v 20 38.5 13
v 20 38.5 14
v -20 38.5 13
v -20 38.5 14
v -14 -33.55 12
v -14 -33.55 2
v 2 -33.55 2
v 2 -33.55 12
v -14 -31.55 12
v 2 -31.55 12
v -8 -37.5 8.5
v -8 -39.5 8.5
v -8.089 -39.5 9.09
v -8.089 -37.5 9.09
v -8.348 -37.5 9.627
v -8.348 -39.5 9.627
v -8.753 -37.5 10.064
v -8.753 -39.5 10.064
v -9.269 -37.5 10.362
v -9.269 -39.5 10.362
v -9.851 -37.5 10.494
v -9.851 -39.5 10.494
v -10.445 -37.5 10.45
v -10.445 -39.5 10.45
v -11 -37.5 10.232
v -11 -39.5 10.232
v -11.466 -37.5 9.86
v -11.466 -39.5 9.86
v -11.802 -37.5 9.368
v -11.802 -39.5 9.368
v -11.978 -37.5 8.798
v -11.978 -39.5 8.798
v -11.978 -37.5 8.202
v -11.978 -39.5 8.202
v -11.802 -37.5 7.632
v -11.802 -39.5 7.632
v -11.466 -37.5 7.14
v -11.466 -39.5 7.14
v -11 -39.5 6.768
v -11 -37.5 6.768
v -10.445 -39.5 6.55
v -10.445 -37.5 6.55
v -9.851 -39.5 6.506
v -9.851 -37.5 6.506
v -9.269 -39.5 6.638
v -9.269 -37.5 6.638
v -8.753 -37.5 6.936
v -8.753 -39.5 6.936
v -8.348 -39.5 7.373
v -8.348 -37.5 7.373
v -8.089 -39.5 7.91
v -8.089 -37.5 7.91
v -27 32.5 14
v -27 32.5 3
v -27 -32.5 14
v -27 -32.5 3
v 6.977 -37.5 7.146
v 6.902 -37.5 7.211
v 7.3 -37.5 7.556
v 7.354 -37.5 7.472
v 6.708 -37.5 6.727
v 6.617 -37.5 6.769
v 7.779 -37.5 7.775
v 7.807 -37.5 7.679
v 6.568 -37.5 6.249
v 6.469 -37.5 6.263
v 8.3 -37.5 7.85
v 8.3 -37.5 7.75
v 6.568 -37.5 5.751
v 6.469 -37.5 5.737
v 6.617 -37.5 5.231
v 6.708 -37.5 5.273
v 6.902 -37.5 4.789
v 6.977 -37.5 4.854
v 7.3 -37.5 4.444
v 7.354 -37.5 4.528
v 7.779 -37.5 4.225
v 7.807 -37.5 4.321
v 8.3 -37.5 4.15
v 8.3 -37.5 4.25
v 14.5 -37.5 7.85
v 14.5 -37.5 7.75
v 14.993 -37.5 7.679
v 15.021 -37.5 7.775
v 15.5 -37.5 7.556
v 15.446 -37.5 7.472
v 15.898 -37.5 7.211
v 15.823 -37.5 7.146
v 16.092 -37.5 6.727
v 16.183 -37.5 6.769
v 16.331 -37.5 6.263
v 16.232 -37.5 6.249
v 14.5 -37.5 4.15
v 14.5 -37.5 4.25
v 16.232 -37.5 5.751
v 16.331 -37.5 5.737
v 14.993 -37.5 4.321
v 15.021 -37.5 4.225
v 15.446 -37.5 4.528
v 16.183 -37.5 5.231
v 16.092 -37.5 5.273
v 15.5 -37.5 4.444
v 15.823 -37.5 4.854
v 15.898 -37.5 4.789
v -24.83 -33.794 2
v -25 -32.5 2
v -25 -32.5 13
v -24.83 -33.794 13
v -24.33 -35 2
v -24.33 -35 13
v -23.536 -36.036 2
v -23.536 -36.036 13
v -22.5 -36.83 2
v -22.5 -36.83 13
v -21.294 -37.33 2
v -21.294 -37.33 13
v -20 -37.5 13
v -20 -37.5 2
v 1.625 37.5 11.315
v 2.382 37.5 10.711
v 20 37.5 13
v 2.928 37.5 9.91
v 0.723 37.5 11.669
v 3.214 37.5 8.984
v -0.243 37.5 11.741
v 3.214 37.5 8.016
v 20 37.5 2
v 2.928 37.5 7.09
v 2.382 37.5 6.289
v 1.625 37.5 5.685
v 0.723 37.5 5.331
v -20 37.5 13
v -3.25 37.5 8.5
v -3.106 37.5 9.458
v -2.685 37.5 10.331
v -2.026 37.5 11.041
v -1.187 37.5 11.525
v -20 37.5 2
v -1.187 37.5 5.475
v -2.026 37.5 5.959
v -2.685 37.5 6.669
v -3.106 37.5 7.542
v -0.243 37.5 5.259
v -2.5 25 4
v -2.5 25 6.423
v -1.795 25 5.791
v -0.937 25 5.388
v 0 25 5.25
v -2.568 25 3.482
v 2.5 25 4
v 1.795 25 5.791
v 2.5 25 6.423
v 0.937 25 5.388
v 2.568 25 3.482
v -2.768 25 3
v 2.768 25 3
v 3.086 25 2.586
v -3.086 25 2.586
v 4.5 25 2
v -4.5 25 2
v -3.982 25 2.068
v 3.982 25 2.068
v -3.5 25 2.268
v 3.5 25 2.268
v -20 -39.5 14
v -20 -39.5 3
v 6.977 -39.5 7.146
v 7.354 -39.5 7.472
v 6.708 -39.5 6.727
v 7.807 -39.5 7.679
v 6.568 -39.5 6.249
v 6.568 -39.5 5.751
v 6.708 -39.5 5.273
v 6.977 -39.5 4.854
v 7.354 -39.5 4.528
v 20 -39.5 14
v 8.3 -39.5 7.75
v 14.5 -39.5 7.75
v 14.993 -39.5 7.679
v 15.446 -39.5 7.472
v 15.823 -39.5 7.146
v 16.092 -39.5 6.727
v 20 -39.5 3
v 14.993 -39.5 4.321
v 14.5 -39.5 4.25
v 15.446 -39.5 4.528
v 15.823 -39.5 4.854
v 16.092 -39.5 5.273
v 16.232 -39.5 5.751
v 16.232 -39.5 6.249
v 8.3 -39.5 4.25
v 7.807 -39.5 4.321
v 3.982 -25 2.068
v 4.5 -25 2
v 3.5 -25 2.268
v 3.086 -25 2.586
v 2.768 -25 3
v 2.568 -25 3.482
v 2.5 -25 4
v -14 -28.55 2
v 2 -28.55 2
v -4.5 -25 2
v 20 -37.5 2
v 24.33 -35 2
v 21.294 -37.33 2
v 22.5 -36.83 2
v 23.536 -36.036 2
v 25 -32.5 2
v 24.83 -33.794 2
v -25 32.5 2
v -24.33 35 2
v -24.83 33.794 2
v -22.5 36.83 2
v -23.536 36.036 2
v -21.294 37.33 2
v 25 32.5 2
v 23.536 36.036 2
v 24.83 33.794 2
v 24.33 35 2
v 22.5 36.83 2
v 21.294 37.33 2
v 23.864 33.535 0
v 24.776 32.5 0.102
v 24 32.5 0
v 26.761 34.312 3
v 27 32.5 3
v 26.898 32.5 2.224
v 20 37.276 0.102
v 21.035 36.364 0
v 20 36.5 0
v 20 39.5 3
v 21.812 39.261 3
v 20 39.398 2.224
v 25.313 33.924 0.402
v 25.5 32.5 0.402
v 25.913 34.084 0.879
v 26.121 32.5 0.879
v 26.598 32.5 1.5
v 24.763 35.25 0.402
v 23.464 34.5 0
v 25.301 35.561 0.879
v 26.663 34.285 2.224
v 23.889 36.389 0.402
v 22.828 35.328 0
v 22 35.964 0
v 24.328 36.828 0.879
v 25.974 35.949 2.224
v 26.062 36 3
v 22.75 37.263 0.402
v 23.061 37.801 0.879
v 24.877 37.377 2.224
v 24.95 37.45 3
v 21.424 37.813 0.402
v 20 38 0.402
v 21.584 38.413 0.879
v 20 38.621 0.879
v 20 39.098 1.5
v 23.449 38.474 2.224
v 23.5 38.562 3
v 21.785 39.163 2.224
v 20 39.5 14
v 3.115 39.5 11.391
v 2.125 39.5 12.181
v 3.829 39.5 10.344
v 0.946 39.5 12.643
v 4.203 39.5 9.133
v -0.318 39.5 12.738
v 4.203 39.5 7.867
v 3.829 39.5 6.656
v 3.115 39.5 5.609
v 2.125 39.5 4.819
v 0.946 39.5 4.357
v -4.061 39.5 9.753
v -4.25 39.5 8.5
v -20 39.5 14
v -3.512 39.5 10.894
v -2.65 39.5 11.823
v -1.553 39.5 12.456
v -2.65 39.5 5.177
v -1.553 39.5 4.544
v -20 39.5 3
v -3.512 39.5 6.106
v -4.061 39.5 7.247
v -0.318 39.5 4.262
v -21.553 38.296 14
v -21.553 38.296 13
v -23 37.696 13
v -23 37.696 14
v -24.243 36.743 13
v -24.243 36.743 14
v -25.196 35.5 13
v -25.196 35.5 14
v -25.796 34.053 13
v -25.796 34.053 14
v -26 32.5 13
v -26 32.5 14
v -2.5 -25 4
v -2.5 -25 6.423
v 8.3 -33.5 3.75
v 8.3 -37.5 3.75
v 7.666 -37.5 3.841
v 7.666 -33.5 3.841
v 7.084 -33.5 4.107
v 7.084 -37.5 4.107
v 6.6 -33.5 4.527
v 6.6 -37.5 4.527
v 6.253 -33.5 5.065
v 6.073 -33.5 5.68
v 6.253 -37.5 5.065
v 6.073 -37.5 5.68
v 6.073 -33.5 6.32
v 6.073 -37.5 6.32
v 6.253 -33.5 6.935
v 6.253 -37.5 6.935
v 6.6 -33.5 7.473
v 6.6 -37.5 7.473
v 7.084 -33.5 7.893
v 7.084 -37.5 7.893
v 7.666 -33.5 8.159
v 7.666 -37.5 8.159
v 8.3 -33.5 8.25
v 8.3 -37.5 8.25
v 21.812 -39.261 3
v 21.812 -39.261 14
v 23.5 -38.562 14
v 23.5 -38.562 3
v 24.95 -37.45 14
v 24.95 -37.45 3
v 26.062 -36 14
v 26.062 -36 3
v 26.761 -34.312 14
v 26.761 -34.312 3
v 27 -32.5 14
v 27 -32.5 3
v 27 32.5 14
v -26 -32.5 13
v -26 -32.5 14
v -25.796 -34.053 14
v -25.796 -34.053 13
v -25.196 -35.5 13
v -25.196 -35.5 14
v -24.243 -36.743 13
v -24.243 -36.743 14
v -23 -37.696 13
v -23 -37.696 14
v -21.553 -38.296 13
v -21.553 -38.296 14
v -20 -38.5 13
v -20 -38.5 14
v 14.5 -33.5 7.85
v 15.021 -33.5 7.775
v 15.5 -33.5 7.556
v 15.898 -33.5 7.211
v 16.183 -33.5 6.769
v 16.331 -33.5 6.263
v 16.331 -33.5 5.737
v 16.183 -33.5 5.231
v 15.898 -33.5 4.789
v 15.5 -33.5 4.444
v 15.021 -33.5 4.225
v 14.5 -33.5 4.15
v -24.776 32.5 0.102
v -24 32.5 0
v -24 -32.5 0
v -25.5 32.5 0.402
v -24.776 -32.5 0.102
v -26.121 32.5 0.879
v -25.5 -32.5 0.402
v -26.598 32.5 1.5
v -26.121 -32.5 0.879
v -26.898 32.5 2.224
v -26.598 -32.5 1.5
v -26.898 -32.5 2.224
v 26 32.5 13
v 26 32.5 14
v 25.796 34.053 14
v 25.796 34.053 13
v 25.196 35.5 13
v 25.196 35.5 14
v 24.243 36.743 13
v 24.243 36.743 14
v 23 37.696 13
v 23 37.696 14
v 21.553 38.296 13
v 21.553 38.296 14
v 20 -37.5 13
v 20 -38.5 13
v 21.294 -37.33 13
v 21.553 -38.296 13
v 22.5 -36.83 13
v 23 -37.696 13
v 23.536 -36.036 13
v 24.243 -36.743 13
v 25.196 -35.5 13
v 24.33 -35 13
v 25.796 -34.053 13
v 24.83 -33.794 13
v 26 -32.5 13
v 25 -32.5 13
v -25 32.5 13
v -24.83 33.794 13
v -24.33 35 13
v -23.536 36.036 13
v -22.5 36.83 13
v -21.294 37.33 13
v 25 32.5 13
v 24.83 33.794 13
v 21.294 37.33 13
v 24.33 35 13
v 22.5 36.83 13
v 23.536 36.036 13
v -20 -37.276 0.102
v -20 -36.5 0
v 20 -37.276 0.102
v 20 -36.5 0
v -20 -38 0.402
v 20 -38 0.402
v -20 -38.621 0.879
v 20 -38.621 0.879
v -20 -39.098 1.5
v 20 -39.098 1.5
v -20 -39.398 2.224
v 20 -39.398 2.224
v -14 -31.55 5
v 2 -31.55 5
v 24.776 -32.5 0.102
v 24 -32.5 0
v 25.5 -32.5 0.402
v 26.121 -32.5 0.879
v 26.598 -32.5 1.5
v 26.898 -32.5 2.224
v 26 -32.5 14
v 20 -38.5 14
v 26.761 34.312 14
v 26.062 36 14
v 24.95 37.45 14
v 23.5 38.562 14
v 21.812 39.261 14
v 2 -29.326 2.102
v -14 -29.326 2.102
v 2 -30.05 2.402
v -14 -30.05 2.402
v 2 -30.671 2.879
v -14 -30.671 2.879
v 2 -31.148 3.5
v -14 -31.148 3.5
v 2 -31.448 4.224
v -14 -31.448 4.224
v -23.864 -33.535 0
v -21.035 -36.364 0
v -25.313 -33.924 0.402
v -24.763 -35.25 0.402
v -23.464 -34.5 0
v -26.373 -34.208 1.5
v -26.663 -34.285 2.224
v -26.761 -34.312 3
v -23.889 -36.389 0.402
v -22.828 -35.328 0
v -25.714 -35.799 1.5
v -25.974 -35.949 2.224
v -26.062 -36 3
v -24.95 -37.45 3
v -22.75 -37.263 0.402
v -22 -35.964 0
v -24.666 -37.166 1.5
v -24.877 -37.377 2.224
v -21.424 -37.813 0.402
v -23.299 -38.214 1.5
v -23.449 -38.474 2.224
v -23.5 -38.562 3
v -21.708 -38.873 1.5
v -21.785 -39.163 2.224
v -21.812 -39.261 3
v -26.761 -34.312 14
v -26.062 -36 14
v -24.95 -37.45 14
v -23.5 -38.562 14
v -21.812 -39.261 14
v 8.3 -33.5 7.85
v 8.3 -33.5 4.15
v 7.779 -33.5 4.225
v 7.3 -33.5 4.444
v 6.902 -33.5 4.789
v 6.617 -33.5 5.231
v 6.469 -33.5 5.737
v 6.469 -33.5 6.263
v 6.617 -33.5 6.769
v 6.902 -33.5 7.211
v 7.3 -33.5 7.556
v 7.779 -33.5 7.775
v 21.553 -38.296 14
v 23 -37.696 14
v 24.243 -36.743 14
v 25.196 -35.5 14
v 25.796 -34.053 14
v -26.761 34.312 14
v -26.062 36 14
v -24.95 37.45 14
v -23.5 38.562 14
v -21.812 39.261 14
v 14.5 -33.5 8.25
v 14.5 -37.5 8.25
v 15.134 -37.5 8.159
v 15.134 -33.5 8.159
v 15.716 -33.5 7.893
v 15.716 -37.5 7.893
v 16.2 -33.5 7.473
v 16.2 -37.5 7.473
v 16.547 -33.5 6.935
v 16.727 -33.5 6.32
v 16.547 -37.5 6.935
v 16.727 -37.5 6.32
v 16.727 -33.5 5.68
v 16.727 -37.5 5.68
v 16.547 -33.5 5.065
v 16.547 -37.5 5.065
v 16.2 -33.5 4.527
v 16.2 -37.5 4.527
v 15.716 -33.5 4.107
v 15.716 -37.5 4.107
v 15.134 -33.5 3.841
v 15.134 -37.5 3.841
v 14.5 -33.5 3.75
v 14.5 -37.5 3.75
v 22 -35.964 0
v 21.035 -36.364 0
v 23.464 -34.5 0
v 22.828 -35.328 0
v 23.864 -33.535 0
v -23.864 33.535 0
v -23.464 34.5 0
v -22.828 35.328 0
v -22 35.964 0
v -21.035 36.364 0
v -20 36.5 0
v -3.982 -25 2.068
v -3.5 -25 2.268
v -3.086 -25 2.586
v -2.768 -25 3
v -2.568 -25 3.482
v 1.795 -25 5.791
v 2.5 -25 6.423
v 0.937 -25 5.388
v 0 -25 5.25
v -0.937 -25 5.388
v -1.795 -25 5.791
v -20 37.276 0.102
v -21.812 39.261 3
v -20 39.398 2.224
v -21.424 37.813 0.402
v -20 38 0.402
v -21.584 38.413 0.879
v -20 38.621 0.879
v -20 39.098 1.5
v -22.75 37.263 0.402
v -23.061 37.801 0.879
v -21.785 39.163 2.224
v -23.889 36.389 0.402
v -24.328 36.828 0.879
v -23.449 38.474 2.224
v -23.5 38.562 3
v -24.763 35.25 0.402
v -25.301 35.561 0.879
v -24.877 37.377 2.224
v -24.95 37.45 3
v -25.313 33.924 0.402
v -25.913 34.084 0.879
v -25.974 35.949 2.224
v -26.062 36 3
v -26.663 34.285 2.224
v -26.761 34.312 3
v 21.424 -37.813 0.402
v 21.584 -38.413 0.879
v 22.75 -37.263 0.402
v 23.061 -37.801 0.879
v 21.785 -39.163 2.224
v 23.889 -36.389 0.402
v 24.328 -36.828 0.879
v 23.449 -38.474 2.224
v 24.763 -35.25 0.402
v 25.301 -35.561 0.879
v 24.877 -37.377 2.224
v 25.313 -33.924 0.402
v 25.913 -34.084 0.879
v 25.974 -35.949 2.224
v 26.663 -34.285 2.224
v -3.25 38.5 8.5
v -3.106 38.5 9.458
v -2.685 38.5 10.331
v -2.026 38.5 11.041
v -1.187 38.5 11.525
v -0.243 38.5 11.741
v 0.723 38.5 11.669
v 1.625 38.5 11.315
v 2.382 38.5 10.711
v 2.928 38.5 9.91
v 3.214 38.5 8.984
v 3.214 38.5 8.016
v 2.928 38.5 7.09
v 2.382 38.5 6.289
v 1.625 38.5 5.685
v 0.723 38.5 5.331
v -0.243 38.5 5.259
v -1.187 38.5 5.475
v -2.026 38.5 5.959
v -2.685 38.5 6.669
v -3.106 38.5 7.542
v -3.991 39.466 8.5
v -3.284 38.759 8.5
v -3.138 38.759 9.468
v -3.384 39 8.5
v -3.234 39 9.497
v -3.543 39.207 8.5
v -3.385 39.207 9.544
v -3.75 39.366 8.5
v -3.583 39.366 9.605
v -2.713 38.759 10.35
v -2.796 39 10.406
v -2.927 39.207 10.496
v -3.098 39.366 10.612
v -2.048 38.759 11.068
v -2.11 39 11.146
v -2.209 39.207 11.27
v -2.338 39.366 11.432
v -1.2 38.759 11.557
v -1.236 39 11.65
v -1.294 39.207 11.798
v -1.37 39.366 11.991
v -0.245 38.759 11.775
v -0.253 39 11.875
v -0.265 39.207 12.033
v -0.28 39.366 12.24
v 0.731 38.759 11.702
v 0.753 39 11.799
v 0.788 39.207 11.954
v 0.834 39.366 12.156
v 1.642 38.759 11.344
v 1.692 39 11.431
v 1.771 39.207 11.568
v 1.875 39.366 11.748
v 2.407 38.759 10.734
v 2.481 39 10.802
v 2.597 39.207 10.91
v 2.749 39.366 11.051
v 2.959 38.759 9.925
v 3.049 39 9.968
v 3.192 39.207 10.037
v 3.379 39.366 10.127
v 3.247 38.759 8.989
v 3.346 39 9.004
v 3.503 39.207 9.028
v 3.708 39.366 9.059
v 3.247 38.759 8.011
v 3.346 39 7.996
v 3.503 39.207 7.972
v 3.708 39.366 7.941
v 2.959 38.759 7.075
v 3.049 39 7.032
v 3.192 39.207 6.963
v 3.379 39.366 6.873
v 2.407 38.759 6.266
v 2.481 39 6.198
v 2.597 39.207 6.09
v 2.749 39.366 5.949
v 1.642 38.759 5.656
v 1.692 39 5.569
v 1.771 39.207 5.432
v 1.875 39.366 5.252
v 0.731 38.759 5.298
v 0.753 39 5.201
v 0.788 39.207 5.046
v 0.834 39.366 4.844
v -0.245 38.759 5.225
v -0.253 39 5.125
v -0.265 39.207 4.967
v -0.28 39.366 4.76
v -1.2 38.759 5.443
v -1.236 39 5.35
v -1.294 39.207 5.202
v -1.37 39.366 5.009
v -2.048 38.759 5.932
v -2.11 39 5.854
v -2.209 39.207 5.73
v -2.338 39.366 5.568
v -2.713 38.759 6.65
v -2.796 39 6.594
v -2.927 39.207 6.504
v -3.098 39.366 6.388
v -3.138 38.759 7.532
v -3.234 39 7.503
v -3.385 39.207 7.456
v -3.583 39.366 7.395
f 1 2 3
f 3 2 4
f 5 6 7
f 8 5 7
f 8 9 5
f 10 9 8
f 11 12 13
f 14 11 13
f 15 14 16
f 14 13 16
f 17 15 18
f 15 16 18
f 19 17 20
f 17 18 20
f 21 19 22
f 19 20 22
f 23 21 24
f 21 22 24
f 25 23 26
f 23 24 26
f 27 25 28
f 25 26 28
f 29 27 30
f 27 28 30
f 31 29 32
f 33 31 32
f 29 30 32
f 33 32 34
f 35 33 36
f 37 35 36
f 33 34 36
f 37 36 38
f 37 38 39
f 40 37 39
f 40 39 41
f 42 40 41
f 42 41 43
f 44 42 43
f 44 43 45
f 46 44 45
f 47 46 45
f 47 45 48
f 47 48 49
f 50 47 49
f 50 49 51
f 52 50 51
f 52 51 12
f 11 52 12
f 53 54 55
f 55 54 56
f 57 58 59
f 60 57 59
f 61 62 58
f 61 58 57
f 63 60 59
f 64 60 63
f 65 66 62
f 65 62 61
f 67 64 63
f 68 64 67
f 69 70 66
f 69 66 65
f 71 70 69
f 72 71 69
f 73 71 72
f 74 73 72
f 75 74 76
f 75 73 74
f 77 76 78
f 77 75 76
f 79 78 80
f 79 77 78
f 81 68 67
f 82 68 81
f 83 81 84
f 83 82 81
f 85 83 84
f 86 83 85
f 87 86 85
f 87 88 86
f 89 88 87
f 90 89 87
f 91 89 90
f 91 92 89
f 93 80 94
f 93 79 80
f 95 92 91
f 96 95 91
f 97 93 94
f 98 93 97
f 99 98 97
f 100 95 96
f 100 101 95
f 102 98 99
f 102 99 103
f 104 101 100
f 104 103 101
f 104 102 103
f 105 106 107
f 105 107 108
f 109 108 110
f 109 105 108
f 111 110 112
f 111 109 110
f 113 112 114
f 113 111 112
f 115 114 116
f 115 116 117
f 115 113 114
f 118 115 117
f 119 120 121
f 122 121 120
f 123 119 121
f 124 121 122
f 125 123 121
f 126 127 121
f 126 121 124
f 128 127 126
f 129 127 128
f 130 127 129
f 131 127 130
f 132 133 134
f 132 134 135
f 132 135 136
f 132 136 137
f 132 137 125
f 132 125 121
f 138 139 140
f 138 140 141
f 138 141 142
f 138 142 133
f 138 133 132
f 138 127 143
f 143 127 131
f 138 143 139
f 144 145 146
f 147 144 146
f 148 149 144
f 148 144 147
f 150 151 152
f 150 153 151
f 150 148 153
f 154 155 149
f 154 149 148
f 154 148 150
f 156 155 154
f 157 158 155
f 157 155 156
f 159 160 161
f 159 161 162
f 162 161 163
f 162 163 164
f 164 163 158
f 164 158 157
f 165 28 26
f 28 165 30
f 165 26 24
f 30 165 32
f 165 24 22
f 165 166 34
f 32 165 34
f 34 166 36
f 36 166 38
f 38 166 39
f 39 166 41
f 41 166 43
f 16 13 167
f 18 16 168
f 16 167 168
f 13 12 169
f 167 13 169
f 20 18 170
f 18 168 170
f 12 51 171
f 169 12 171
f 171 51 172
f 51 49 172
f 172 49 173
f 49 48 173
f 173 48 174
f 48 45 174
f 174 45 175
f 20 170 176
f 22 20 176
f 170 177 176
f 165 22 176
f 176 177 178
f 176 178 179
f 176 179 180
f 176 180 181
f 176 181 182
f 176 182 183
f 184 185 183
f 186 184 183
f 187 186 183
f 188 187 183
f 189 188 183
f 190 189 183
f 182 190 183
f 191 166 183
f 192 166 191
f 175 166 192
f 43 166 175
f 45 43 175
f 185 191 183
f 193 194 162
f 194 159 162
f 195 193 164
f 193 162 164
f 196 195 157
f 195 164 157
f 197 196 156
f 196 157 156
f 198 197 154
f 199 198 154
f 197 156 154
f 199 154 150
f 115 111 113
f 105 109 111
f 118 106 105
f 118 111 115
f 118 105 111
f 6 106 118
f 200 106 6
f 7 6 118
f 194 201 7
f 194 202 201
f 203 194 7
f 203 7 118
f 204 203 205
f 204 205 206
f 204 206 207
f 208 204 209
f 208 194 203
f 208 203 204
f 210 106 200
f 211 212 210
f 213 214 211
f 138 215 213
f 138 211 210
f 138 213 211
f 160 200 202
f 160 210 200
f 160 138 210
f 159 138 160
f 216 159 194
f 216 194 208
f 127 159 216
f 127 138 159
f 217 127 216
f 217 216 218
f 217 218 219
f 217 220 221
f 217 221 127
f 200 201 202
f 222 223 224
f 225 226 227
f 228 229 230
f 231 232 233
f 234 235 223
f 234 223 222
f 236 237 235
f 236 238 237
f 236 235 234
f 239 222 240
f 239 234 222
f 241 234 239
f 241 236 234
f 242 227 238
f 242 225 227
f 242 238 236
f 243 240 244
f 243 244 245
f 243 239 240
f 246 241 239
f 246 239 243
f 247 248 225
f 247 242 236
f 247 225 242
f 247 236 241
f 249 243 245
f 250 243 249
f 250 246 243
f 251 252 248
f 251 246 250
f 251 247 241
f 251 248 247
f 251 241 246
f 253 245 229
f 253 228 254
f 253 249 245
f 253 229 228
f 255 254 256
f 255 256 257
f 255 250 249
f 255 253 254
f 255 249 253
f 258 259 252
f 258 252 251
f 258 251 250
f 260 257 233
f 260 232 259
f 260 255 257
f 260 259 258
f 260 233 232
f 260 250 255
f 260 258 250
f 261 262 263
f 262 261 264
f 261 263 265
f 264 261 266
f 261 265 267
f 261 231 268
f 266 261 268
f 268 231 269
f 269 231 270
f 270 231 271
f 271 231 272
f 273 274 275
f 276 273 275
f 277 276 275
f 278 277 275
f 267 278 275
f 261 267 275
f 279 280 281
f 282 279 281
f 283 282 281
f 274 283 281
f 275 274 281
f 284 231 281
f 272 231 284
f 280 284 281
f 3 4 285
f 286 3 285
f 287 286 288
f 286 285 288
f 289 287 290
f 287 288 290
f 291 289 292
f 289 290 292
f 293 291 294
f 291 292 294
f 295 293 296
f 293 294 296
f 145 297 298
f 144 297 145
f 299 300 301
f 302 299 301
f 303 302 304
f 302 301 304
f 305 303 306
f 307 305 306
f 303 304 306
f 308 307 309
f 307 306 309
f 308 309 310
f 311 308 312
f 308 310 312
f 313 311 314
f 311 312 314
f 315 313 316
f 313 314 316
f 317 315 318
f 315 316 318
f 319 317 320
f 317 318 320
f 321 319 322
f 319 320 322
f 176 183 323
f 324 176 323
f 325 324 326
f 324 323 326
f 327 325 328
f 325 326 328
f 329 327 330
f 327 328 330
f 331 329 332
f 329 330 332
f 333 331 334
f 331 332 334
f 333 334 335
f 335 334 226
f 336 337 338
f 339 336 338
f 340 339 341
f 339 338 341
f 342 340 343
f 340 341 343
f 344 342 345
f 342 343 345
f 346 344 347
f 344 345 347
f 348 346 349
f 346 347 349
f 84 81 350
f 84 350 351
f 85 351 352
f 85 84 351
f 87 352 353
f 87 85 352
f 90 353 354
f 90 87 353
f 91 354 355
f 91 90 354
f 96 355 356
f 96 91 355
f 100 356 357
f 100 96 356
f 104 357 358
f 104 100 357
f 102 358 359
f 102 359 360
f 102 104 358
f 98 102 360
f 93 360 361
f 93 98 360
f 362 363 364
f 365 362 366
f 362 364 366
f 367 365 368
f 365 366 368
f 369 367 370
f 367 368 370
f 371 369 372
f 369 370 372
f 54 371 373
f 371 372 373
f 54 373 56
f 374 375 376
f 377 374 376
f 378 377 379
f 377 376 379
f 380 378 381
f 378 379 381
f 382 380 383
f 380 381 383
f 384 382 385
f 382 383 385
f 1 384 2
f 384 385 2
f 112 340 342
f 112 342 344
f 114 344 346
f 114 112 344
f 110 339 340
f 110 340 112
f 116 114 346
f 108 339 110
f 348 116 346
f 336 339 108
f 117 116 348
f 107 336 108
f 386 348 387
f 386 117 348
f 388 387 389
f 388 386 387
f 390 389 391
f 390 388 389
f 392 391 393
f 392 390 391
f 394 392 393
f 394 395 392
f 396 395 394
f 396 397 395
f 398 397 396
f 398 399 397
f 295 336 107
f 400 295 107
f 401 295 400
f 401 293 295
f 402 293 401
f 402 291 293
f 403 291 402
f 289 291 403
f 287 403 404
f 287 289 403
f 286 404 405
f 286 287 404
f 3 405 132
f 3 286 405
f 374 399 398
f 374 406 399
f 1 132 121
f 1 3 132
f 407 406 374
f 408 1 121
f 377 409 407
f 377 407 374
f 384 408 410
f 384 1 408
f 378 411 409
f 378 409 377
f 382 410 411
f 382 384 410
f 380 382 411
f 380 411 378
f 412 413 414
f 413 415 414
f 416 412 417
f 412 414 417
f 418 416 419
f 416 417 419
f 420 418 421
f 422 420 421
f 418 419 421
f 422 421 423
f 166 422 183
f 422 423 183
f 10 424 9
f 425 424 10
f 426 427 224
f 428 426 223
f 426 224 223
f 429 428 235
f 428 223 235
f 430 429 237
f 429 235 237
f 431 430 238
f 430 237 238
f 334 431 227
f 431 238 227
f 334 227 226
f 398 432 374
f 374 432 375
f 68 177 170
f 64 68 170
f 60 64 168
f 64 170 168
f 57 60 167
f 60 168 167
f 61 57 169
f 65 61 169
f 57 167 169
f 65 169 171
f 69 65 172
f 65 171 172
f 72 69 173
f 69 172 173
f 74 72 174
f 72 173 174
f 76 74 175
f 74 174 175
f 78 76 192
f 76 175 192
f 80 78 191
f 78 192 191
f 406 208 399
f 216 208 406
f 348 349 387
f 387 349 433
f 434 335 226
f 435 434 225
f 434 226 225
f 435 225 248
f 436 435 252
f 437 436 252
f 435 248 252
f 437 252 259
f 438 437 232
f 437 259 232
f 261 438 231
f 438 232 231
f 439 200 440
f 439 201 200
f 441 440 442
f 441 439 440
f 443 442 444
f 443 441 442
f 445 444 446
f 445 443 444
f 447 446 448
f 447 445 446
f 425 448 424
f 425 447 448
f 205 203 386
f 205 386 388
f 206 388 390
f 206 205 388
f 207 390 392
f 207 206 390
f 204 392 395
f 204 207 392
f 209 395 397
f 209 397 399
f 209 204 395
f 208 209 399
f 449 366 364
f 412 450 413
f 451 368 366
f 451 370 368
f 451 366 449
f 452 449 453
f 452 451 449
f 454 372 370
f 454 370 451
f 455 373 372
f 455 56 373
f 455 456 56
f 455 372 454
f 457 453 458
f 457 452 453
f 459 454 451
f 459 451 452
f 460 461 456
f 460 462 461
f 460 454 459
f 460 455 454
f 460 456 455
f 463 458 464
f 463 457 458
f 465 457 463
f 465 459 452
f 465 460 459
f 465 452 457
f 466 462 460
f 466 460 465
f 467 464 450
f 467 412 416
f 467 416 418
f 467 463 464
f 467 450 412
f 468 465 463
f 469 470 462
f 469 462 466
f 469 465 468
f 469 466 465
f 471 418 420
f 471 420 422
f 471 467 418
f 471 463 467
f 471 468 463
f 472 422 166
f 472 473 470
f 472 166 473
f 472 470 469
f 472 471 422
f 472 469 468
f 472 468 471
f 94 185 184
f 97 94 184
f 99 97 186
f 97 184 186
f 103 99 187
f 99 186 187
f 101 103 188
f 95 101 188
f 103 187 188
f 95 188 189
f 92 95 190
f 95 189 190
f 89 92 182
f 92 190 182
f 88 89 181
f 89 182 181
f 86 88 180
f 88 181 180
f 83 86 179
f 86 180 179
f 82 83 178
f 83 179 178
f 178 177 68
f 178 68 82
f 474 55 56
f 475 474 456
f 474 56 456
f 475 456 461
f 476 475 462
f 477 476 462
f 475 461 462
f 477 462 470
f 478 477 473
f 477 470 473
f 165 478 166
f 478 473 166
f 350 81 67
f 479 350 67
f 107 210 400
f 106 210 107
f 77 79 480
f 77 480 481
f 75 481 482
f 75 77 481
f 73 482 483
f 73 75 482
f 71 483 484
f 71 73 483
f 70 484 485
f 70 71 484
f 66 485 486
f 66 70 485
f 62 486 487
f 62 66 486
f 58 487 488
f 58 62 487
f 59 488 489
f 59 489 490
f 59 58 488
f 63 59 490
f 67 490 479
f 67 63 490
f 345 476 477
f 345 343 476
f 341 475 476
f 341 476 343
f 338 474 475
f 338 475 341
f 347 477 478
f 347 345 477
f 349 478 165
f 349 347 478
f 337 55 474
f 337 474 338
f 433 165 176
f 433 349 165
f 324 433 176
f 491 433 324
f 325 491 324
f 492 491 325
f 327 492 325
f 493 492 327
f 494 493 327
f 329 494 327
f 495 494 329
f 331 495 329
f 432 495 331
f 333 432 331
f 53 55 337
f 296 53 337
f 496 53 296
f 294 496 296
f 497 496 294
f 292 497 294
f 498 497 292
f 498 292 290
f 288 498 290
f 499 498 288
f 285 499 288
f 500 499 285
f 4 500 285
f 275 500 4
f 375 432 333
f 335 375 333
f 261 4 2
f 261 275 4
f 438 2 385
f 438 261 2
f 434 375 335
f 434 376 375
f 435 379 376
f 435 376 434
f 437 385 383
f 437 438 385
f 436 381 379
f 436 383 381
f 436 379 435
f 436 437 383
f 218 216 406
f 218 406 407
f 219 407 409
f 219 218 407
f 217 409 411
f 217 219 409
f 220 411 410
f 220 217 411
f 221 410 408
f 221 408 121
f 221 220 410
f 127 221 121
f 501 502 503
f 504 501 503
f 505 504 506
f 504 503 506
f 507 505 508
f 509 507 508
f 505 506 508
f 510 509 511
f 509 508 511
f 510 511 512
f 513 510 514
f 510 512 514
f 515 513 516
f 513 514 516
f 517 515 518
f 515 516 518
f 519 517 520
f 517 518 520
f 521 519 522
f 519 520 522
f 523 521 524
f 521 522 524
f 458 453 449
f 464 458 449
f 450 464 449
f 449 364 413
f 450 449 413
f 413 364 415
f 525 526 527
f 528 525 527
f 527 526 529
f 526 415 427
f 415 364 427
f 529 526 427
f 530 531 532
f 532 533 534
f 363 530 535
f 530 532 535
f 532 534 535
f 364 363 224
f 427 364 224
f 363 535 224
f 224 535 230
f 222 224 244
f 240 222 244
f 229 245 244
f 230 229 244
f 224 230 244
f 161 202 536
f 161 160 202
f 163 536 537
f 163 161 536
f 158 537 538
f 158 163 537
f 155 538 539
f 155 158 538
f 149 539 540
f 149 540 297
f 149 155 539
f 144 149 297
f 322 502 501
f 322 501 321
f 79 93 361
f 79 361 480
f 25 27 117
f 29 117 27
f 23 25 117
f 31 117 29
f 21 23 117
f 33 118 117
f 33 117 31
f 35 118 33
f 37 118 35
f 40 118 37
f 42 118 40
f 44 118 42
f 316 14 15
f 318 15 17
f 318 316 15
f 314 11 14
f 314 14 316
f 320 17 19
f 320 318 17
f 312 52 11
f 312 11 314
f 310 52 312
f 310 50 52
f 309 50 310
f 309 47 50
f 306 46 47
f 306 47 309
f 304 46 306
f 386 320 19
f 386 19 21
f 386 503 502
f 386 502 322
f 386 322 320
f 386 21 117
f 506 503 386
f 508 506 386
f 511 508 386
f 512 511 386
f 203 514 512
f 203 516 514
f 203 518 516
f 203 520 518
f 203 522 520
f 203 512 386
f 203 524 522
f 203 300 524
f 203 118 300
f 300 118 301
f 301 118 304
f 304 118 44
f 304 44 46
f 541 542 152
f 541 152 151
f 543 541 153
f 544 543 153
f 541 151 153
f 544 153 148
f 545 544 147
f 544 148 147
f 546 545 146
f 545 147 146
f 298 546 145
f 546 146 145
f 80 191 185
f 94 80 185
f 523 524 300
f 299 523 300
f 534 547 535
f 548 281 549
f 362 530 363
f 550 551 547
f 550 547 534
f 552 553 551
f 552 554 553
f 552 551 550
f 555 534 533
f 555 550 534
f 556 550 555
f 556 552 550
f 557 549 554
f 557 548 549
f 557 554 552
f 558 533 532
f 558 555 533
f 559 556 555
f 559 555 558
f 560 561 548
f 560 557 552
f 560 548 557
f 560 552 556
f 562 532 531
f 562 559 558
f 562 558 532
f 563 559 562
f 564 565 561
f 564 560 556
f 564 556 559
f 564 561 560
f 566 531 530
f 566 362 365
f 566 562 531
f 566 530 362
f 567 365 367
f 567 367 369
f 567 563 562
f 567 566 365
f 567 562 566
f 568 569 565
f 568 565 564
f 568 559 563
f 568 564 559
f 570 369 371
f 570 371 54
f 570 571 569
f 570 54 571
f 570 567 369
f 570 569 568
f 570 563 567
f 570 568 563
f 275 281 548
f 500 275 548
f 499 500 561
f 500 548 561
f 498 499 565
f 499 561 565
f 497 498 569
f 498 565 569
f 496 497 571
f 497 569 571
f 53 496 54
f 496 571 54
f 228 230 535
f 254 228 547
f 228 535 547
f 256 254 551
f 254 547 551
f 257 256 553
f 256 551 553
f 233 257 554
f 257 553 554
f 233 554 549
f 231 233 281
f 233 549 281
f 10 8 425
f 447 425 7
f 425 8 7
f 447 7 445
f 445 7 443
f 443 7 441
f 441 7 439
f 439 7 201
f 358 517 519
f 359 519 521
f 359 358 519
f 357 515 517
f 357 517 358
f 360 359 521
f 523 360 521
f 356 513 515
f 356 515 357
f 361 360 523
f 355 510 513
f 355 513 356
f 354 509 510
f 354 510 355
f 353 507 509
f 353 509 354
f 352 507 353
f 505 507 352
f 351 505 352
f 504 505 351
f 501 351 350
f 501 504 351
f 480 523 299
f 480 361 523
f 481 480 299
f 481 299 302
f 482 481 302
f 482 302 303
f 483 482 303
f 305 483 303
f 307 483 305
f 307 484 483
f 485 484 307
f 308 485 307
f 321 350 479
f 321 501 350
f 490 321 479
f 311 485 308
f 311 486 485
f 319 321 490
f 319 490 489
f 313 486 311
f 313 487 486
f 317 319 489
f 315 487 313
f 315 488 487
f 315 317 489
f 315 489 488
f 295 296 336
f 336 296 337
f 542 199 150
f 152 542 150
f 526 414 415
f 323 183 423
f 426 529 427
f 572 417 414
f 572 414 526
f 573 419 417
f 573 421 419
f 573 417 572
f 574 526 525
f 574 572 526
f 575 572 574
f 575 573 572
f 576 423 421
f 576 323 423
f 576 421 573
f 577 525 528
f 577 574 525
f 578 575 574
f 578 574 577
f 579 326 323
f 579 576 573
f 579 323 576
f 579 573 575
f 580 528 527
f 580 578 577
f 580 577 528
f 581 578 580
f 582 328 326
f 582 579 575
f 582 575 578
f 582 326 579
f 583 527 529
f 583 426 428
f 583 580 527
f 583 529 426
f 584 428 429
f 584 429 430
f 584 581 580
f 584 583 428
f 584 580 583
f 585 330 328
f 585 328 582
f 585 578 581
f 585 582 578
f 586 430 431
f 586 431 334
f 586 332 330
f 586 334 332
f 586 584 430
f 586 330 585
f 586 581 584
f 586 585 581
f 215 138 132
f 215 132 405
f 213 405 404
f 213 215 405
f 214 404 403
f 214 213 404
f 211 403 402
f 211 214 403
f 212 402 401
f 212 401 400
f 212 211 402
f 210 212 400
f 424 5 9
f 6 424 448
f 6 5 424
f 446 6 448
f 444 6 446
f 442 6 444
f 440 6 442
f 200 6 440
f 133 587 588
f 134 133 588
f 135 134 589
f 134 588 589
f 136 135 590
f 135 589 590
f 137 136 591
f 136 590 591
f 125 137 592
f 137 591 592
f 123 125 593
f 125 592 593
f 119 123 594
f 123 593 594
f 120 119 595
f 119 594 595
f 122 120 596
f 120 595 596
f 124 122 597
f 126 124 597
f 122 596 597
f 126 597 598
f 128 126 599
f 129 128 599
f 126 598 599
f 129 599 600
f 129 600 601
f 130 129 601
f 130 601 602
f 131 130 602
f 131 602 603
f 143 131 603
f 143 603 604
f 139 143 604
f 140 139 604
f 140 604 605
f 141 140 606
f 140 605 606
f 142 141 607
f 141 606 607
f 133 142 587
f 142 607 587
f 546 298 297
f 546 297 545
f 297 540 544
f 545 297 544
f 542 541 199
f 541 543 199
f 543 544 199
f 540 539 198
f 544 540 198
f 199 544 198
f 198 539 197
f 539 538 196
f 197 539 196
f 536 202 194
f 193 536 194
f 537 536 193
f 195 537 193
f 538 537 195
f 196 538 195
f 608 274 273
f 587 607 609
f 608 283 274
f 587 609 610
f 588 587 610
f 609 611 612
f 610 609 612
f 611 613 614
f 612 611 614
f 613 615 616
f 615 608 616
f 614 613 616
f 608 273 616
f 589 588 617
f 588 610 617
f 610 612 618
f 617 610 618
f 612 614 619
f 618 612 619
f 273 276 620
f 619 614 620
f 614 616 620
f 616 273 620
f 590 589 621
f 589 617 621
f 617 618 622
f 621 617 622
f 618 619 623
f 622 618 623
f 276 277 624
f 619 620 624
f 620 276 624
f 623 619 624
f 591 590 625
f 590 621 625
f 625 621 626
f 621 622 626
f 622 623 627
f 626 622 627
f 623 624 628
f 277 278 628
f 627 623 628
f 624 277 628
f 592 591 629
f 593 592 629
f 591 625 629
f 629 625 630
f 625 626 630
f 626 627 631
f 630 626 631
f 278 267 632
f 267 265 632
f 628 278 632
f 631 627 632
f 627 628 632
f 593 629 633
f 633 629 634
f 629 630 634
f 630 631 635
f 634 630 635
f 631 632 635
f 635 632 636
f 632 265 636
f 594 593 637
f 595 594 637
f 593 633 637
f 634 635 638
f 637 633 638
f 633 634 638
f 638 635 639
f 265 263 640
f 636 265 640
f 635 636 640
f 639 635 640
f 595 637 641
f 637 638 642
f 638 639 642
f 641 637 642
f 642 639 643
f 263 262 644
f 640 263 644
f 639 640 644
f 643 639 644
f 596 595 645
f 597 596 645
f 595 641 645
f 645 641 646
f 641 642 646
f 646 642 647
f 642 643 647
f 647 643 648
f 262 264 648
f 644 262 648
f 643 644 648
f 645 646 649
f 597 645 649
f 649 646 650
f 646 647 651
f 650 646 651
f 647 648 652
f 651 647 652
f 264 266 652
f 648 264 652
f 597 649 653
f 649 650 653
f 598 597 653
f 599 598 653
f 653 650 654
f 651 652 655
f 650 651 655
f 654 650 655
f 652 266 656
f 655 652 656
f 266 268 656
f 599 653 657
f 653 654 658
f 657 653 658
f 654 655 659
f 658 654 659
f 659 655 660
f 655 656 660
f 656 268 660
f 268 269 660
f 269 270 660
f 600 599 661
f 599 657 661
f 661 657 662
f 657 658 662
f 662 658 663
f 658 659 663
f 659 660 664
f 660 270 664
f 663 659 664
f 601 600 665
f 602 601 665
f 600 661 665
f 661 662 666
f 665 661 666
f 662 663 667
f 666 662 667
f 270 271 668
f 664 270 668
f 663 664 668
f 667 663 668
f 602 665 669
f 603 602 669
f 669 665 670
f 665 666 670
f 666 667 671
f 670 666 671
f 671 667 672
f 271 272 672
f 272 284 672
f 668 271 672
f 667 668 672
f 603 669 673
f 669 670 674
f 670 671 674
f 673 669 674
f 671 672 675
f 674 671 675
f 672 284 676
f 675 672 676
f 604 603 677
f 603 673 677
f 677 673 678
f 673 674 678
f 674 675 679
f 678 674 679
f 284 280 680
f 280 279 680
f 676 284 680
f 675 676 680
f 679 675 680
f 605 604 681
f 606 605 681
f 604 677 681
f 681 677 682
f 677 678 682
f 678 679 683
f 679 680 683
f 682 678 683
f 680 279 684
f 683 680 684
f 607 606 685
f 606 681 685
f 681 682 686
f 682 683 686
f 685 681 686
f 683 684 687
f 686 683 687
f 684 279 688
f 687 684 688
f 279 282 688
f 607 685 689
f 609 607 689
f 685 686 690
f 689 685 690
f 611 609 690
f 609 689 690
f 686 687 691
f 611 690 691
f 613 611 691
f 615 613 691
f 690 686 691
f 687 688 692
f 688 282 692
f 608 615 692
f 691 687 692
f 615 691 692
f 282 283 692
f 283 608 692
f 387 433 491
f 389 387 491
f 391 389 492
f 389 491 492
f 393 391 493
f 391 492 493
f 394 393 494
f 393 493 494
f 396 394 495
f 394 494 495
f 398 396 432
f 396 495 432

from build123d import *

# Parameters (mm, degrees)
PAD_DEPTH       = 2
PAD001_DEPTH    = 12
FILLET_R        = 3
SKETCH002_R     = 2
POCKET_DEPTH    = 5
POCKET003_DEPTH = 1
SKETCH016_W     = 16
SKETCH016_H     = 2
PAD007_DEPTH    = 10
FILLET002_R     = 3
PAD008_DEPTH    = 4
SKETCH019_R     = 3.25
POCKET005_DEPTH = 2
FILLET004_R     = 1
SKETCH020_W     = 5
SKETCH020_H     = 50
PAD009_DEPTH    = 8
FILLET005_R     = 2
SKETCH021_R     = 3.25
POCKET006_DEPTH = 50


with BuildPart() as part:
    # Sketch → Pad (new body)
    with BuildSketch(Plane.XY):
        with BuildLine():
            Line((-27, 32.5), (-27, -32.5))
            ThreePointArc((-27, -32.5), (-24.949747, -37.449747), (-20, -39.5))
            Line((-20, -39.5), (20, -39.5))
            ThreePointArc((20, -39.5), (24.949747, -37.449747), (27, -32.5))
            Line((27, -32.5), (27, 32.5))
            ThreePointArc((27, 32.5), (24.949747, 37.449747), (20, 39.5))
            Line((20, 39.5), (-20, 39.5))
            ThreePointArc((-20, 39.5), (-24.949747, 37.449747), (-27, 32.5))
        make_face()
    extrude(amount=PAD_DEPTH)

    # Sketch001 (on Face10 of Pad) → Pad001 (join)
    with BuildSketch(Plane.XY.offset(2)):
        with BuildLine():
            Line((-27, 32.5), (-27, -32.5))
            ThreePointArc((-27, -32.5), (-24.949747, -37.449747), (-20, -39.5))
            Line((-20, -39.5), (20, -39.5))
            ThreePointArc((20, -39.5), (24.949747, -37.449747), (27, -32.5))
            Line((27, -32.5), (27, 32.5))
            ThreePointArc((27, 32.5), (24.949747, 37.449747), (20, 39.5))
            Line((20, 39.5), (-20, 39.5))
            ThreePointArc((-20, 39.5), (-24.949747, 37.449747), (-27, 32.5))
        make_face()
        with BuildLine():
            Line((-25, 32.5), (-25, -32.5))
            ThreePointArc((-25, -32.5), (-23.535534, -36.035534), (-20, -37.5))
            Line((-20, -37.5), (20, -37.5))
            ThreePointArc((20, -37.5), (23.535534, -36.035534), (25, -32.5))
            Line((25, -32.5), (25, 32.5))
            ThreePointArc((25, 32.5), (23.535534, 36.035534), (20, 37.5))
            Line((20, 37.5), (-20, 37.5))
            ThreePointArc((-20, 37.5), (-23.535534, 36.035534), (-25, 32.5))
        make_face(mode=Mode.SUBTRACT)
    extrude(amount=PAD001_DEPTH)

    # Fillet
    fillet_edges = [part.edges().sort_by_distance(p)[0] for p in [
        (0, -39.5, 0),
    ]]
    fillet(fillet_edges, radius=FILLET_R)

    # Sketch002 (on Face10 of Fillet) → Pocket (cut)
    with BuildSketch(Plane.XZ.offset(39.5)):
        with Locations((-10, 8.5)):
            Circle(SKETCH002_R)
        with BuildLine():
            ThreePointArc((8.3, 7.75), (6.55, 6), (8.3, 4.25))
            Line((8.3, 4.25), (14.5, 4.25))
            ThreePointArc((14.5, 4.25), (16.25, 6), (14.5, 7.75))
            Line((8.3, 7.75), (14.5, 7.75))
        make_face()
    extrude(amount=-POCKET_DEPTH, mode=Mode.SUBTRACT)

    # Sketch007 → Pocket003 (cut)
    with BuildSketch(Plane.XY.offset(14)):
        with BuildLine():
            Line((-26, 32.5), (-26, -32.5))
            ThreePointArc((-26, -32.5), (-24.242641, -36.742641), (-20, -38.5))
            Line((-20, -38.5), (20, -38.5))
            ThreePointArc((20, -38.5), (24.242641, -36.742641), (26, -32.5))
            Line((26, -32.5), (26, 32.5))
            ThreePointArc((26, 32.5), (24.242641, 36.742641), (20, 38.5))
            Line((20, 38.5), (-20, 38.5))
            ThreePointArc((-20, 38.5), (-24.242641, 36.742641), (-26, 32.5))
        make_face()
        with BuildLine():
            Line((-25, 32.5), (-25, -32.5))
            ThreePointArc((-25, -32.5), (-23.535534, -36.035534), (-20, -37.5))
            Line((-20, -37.5), (20, -37.5))
            ThreePointArc((20, -37.5), (23.535534, -36.035534), (25, -32.5))
            Line((25, -32.5), (25, 32.5))
            ThreePointArc((25, 32.5), (23.535534, 36.035534), (20, 37.5))
            Line((20, 37.5), (-20, 37.5))
            ThreePointArc((-20, 37.5), (-23.535534, 36.035534), (-25, 32.5))
        make_face(mode=Mode.SUBTRACT)
    extrude(amount=-POCKET003_DEPTH, mode=Mode.SUBTRACT)

    # Sketch016 (on Face34 of Pocket003) → Pad007 (join)
    with BuildSketch(Plane.XY.offset(2)):
        with Locations((-6, -32.55)):
            Rectangle(SKETCH016_W, SKETCH016_H)
    extrude(amount=PAD007_DEPTH)

    # Fillet002
    fillet002_edges = [part.edges().sort_by_distance(p)[0] for p in [
        (-6, -31.55, 2),
    ]]
    fillet(fillet002_edges, radius=FILLET002_R)

    # Sketch017 (on Face12 of Fillet002) → Pad008 (join)
    with BuildSketch(Plane(origin=(0, -37.5, 0), x_dir=(-1, 0, 0), z_dir=(0, 1, 0))):
        with BuildLine():
            ThreePointArc((-14.5, 8.25), (-16.75, 6), (-14.5, 3.75))
            Line((-14.5, 3.75), (-8.3, 3.75))
            ThreePointArc((-8.3, 3.75), (-6.05, 6), (-8.3, 8.25))
            Line((-14.5, 8.25), (-8.3, 8.25))
        make_face()
        with BuildLine():
            ThreePointArc((-14.5, 7.85), (-16.35, 6), (-14.5, 4.15))
            Line((-14.5, 4.15), (-8.3, 4.15))
            ThreePointArc((-8.3, 4.15), (-6.45, 6), (-8.3, 7.85))
            Line((-14.5, 7.85), (-8.3, 7.85))
        make_face(mode=Mode.SUBTRACT)
    extrude(amount=PAD008_DEPTH)

    # Sketch019 (on Face46 of Pad008) → Pocket005 (cut)
    with BuildSketch(Plane(origin=(0, 39.5, 0), x_dir=(-1, 0, 0), z_dir=(0, 1, 0))):
        with Locations((0, 8.5)):
            Circle(SKETCH019_R)
    extrude(amount=-POCKET005_DEPTH, mode=Mode.SUBTRACT)

    # Fillet004
    fillet004_edges = [part.edges().sort_by_distance(p)[0] for p in [
        (3.25, 39.5, 8.5),
    ]]
    fillet(fillet004_edges, radius=FILLET004_R)

    # Sketch020 (on Face5 of Fillet004) → Pad009 (join)
    with BuildSketch(Plane.XY.offset(2)):
        Rectangle(SKETCH020_W, SKETCH020_H)
    extrude(amount=PAD009_DEPTH)

    # Fillet005
    fillet005_edges = [part.edges().sort_by_distance(p)[0] for p in [
        (2.5, 0, 2),
        (-2.5, 0, 2),
    ]]
    fillet(fillet005_edges, radius=FILLET005_R)

    # Sketch021 (on Face4 of Fillet005) → Pocket006 (cut)
    with BuildSketch(Plane(origin=(0, 25, 0), x_dir=(-1, 0, 0), z_dir=(0, 1, 0))):
        with Locations((0, 8.5)):
            Circle(SKETCH021_R)
    extrude(amount=-POCKET006_DEPTH, mode=Mode.SUBTRACT)


solid = part.part
